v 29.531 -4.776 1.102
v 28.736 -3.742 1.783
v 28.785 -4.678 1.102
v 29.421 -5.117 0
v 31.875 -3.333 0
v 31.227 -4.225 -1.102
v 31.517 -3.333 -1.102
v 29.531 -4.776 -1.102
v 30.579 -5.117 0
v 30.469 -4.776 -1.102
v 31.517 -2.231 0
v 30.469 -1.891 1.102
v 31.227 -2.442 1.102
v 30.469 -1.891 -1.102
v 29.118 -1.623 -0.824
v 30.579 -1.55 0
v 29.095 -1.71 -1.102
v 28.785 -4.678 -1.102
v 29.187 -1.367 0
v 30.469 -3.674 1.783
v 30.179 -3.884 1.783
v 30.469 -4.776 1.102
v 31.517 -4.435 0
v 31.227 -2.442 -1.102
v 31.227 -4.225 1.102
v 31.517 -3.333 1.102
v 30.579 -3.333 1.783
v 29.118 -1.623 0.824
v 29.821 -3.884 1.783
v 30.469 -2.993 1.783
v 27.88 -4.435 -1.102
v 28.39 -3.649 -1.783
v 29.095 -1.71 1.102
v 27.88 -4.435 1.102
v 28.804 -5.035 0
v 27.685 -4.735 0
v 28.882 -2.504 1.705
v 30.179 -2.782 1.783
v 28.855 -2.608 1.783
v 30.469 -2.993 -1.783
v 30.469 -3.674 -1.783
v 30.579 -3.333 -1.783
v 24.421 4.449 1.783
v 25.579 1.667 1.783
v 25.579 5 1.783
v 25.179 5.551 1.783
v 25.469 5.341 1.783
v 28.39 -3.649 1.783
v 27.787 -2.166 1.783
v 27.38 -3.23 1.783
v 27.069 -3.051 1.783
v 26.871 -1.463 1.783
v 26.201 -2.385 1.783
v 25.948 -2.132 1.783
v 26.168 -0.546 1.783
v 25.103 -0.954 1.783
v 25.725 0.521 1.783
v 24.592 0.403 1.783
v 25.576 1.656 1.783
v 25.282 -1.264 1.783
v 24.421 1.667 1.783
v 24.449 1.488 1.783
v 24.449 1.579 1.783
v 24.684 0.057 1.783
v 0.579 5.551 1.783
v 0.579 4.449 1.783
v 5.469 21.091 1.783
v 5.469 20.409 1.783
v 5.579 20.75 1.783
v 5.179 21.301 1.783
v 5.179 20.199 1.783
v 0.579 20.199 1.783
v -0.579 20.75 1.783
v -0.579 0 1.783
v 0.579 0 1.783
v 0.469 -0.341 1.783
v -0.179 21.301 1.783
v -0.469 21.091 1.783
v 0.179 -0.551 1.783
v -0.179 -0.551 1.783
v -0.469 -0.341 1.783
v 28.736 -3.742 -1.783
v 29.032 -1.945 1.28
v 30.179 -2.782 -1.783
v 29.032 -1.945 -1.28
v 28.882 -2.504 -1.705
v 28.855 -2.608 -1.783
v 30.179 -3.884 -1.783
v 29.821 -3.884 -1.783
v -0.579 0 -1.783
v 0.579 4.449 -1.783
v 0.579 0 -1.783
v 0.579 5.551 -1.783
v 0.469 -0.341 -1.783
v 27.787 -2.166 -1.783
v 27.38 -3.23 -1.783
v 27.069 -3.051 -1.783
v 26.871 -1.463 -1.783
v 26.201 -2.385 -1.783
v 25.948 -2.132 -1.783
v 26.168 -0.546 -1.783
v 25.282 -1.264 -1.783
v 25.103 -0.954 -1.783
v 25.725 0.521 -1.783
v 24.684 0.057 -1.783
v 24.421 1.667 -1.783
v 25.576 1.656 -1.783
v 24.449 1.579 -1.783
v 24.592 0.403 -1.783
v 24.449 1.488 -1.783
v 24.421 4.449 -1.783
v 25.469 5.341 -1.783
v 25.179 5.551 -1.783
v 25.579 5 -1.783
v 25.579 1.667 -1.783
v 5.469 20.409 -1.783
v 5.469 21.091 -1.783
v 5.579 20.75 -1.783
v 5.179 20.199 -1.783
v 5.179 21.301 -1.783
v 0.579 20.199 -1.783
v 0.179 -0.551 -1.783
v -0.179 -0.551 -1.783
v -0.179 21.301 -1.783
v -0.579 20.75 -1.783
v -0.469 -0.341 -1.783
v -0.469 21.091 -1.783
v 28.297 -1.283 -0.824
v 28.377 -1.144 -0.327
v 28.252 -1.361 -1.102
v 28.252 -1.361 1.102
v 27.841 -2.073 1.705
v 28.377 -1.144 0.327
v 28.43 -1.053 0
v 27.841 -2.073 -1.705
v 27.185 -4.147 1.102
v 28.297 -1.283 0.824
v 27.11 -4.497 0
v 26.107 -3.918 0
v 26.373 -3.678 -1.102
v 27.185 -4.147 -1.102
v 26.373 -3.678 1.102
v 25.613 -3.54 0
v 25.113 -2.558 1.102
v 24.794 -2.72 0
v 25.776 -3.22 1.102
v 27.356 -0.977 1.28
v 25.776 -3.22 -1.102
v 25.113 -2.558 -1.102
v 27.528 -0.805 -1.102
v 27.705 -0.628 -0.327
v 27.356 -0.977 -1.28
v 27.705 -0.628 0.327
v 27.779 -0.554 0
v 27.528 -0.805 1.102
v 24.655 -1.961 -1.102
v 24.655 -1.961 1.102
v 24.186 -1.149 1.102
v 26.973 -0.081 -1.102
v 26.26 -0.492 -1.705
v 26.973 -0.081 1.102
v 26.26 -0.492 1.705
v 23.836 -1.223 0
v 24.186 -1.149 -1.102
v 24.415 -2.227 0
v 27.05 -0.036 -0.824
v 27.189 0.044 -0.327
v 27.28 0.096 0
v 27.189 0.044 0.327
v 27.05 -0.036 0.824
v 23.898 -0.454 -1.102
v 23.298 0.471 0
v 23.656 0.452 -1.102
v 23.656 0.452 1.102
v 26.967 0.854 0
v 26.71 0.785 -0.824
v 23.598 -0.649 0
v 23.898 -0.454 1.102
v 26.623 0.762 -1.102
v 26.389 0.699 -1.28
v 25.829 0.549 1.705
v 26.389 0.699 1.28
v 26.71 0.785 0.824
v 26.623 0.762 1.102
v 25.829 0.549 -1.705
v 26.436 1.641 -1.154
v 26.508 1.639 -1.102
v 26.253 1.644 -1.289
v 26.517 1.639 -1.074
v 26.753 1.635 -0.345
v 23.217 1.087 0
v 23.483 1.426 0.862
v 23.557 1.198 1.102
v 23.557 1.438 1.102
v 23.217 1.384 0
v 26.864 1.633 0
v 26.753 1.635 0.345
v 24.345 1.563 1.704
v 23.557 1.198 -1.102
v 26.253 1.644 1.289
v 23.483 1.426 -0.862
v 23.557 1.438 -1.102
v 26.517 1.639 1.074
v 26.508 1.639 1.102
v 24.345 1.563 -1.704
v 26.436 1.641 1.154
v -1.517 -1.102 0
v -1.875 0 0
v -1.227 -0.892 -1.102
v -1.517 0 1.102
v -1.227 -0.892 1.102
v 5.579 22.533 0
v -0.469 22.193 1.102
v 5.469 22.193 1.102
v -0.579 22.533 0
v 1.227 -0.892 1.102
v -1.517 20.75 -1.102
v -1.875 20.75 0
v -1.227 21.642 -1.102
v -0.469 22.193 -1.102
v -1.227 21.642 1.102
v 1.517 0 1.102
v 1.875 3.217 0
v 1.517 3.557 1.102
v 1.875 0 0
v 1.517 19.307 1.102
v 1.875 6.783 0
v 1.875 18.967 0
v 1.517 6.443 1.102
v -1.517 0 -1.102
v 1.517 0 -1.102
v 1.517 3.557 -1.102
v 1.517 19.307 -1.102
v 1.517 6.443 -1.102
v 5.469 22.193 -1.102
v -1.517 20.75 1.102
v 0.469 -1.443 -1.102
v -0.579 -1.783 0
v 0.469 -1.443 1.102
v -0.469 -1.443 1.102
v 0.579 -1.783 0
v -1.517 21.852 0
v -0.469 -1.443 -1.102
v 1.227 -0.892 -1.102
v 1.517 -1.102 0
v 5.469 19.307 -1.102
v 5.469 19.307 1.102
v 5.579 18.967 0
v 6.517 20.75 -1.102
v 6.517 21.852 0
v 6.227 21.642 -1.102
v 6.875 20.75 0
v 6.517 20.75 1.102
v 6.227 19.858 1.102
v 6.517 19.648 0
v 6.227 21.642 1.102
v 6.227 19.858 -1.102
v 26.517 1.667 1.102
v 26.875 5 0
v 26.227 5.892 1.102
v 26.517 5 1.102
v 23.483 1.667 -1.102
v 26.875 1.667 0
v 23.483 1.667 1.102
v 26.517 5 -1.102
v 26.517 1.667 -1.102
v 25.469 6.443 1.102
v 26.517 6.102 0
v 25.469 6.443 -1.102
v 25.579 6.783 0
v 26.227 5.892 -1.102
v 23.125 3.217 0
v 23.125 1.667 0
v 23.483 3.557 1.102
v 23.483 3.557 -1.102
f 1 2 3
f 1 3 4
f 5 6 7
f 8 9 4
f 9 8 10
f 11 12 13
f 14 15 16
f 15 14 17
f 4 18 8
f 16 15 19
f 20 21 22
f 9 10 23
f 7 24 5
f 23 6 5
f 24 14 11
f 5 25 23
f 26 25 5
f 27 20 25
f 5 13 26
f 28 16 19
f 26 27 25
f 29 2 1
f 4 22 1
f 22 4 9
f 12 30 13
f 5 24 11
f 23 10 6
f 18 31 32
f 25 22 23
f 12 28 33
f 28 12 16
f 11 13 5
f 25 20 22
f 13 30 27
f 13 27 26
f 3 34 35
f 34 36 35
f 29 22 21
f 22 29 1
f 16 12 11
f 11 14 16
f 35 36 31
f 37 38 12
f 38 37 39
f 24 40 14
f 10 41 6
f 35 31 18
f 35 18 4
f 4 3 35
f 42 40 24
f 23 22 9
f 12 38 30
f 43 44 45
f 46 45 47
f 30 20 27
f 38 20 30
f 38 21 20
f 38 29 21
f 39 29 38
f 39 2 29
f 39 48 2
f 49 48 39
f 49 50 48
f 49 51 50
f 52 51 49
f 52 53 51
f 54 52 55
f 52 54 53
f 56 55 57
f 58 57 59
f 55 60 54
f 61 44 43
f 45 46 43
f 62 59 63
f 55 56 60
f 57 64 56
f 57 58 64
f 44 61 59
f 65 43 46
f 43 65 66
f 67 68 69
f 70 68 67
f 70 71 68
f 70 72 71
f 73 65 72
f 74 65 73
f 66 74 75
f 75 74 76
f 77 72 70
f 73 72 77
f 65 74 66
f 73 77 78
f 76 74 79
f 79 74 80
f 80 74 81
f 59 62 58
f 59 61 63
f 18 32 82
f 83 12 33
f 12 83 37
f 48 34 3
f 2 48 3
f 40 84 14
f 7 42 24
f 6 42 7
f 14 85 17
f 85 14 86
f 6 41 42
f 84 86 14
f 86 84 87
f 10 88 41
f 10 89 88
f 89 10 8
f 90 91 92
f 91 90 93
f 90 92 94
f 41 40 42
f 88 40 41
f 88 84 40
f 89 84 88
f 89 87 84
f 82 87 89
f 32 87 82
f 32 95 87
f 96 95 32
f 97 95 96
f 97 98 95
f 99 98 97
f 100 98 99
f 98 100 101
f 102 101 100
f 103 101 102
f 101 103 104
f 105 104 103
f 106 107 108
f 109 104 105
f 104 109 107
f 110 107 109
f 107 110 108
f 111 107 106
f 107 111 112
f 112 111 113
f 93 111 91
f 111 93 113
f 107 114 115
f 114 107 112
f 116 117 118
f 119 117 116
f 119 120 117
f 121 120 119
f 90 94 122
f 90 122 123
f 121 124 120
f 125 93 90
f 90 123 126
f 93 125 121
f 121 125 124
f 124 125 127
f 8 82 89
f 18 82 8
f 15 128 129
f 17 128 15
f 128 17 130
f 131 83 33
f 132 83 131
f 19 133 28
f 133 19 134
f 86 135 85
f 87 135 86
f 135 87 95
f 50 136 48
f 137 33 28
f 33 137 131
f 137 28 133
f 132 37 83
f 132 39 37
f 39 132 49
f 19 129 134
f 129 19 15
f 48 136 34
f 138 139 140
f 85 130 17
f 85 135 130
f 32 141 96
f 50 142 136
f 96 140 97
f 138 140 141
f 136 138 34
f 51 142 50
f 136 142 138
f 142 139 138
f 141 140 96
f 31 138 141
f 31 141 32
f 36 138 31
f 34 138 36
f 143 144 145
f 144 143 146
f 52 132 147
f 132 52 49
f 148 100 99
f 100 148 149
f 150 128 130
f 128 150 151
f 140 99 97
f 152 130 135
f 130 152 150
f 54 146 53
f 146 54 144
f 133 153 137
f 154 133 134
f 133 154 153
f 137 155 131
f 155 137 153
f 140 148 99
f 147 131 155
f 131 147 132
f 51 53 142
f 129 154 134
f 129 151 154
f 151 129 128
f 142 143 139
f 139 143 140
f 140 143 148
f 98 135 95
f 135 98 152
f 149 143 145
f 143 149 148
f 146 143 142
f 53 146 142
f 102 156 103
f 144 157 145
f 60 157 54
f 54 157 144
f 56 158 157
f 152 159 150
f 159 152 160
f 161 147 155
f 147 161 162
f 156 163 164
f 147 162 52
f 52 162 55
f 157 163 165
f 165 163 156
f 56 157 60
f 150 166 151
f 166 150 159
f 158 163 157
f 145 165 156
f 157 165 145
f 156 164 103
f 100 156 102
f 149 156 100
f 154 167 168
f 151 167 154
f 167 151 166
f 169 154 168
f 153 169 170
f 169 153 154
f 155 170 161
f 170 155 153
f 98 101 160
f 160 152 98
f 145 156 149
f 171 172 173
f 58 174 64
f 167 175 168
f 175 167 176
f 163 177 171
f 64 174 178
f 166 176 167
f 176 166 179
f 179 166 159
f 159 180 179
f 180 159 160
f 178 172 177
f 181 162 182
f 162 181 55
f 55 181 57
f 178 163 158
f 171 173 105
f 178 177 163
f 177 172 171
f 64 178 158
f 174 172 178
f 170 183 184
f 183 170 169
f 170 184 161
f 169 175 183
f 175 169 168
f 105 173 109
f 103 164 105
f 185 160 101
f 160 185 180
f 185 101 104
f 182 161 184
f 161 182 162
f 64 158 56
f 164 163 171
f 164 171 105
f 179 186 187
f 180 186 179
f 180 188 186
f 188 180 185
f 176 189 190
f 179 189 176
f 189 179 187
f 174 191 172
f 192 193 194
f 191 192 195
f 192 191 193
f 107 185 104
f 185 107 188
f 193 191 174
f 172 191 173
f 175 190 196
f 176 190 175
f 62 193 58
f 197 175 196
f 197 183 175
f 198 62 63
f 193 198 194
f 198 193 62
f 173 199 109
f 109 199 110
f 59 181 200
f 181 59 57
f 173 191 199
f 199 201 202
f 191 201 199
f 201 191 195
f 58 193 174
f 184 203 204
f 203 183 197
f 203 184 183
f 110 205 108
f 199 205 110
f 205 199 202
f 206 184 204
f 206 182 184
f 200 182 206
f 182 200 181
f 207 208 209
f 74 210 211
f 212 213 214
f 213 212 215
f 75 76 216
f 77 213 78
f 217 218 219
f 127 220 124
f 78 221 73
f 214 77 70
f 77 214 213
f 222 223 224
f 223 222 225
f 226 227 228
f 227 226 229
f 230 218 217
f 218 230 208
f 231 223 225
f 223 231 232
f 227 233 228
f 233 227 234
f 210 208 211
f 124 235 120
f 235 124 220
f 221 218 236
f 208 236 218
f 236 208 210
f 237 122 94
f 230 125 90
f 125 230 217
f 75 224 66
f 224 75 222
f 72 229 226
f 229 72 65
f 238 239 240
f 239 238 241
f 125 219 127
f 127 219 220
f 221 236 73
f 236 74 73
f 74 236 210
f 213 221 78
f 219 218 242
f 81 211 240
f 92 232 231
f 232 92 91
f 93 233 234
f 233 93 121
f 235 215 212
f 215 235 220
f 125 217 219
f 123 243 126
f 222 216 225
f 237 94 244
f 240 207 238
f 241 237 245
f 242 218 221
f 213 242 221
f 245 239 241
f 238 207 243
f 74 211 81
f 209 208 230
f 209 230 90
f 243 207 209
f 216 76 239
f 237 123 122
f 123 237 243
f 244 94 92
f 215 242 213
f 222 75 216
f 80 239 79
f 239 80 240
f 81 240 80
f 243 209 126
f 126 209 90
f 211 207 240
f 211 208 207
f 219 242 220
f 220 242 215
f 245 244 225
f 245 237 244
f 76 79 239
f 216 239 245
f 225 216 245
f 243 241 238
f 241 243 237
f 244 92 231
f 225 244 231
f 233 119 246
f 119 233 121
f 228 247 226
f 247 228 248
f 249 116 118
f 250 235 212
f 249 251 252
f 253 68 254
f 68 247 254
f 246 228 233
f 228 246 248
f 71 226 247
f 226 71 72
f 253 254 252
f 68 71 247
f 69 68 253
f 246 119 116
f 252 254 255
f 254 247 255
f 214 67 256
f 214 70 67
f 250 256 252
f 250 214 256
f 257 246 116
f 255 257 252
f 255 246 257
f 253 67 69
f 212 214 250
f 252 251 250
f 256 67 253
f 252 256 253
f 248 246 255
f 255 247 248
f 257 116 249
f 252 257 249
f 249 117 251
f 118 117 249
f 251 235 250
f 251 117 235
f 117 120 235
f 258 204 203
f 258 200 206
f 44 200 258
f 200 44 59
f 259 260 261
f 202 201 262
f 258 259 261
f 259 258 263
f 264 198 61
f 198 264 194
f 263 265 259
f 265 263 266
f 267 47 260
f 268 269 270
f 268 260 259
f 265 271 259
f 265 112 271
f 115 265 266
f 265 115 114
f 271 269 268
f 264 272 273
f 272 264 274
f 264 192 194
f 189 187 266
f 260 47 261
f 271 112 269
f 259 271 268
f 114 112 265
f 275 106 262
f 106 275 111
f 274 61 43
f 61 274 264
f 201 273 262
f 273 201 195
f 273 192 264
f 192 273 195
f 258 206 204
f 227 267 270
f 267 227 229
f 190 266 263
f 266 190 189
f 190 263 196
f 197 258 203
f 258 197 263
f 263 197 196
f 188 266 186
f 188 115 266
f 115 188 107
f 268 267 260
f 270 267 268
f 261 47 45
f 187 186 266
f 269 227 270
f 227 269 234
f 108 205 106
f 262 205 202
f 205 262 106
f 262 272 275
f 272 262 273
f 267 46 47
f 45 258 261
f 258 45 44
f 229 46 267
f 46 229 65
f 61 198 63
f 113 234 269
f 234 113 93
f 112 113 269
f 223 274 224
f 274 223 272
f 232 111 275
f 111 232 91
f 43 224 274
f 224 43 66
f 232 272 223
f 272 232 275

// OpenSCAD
// Diameter of the pegboard holes
holeDiameter = 3.75;
// Spacing between the holes
holeSpacing = 25;
// Thickness of the board itself (oversize this a bit for a better fit)
thickness = 5;

// Length of the hook
hookLength = 12;
// Heigth of the hook
hookHeight = 5;

/* [HIDDEN] */
holeRadius = holeDiameter / 2;
step = 15;
$fn = 10;

hook();

module hook() {
  hull() {
      sphere(r = holeRadius);
      translate([0, hookLength + thickness + holeDiameter, 0])
          sphere(r = holeRadius);
  }

  translate([0, hookLength + thickness + holeDiameter, 0]) {
      hull() {
          sphere(r = holeRadius);
          translate([hookHeight, 0, 0])
              sphere(r = holeRadius);
      }
  }

  translate([holeSpacing, thickness * 1 / 3, 0]) {
      hull() {
      sphere(r = holeRadius);
      translate([0, thickness * 2 / 3, 0])
          sphere(r = holeRadius);
      }
  }

  translate([holeSpacing + thickness, thickness * 1 / 3, 0]) {
      for(a = [step:step:(90)]) {  
          hull() {
              rotate([0, 0, 180 - a])
                  translate([0, thickness, 0])
                      sphere(r = holeRadius);
              rotate([0, 0, 180 - a + step])
                  translate([0, thickness, 0])
                      sphere(r = holeRadius);
          }
      }
  }

  translate([0, thickness, 0]) {
      hull() {
          sphere(r = holeRadius);
          translate([holeSpacing, 0, 0])
              sphere(r = holeRadius);
      }
  }
}
